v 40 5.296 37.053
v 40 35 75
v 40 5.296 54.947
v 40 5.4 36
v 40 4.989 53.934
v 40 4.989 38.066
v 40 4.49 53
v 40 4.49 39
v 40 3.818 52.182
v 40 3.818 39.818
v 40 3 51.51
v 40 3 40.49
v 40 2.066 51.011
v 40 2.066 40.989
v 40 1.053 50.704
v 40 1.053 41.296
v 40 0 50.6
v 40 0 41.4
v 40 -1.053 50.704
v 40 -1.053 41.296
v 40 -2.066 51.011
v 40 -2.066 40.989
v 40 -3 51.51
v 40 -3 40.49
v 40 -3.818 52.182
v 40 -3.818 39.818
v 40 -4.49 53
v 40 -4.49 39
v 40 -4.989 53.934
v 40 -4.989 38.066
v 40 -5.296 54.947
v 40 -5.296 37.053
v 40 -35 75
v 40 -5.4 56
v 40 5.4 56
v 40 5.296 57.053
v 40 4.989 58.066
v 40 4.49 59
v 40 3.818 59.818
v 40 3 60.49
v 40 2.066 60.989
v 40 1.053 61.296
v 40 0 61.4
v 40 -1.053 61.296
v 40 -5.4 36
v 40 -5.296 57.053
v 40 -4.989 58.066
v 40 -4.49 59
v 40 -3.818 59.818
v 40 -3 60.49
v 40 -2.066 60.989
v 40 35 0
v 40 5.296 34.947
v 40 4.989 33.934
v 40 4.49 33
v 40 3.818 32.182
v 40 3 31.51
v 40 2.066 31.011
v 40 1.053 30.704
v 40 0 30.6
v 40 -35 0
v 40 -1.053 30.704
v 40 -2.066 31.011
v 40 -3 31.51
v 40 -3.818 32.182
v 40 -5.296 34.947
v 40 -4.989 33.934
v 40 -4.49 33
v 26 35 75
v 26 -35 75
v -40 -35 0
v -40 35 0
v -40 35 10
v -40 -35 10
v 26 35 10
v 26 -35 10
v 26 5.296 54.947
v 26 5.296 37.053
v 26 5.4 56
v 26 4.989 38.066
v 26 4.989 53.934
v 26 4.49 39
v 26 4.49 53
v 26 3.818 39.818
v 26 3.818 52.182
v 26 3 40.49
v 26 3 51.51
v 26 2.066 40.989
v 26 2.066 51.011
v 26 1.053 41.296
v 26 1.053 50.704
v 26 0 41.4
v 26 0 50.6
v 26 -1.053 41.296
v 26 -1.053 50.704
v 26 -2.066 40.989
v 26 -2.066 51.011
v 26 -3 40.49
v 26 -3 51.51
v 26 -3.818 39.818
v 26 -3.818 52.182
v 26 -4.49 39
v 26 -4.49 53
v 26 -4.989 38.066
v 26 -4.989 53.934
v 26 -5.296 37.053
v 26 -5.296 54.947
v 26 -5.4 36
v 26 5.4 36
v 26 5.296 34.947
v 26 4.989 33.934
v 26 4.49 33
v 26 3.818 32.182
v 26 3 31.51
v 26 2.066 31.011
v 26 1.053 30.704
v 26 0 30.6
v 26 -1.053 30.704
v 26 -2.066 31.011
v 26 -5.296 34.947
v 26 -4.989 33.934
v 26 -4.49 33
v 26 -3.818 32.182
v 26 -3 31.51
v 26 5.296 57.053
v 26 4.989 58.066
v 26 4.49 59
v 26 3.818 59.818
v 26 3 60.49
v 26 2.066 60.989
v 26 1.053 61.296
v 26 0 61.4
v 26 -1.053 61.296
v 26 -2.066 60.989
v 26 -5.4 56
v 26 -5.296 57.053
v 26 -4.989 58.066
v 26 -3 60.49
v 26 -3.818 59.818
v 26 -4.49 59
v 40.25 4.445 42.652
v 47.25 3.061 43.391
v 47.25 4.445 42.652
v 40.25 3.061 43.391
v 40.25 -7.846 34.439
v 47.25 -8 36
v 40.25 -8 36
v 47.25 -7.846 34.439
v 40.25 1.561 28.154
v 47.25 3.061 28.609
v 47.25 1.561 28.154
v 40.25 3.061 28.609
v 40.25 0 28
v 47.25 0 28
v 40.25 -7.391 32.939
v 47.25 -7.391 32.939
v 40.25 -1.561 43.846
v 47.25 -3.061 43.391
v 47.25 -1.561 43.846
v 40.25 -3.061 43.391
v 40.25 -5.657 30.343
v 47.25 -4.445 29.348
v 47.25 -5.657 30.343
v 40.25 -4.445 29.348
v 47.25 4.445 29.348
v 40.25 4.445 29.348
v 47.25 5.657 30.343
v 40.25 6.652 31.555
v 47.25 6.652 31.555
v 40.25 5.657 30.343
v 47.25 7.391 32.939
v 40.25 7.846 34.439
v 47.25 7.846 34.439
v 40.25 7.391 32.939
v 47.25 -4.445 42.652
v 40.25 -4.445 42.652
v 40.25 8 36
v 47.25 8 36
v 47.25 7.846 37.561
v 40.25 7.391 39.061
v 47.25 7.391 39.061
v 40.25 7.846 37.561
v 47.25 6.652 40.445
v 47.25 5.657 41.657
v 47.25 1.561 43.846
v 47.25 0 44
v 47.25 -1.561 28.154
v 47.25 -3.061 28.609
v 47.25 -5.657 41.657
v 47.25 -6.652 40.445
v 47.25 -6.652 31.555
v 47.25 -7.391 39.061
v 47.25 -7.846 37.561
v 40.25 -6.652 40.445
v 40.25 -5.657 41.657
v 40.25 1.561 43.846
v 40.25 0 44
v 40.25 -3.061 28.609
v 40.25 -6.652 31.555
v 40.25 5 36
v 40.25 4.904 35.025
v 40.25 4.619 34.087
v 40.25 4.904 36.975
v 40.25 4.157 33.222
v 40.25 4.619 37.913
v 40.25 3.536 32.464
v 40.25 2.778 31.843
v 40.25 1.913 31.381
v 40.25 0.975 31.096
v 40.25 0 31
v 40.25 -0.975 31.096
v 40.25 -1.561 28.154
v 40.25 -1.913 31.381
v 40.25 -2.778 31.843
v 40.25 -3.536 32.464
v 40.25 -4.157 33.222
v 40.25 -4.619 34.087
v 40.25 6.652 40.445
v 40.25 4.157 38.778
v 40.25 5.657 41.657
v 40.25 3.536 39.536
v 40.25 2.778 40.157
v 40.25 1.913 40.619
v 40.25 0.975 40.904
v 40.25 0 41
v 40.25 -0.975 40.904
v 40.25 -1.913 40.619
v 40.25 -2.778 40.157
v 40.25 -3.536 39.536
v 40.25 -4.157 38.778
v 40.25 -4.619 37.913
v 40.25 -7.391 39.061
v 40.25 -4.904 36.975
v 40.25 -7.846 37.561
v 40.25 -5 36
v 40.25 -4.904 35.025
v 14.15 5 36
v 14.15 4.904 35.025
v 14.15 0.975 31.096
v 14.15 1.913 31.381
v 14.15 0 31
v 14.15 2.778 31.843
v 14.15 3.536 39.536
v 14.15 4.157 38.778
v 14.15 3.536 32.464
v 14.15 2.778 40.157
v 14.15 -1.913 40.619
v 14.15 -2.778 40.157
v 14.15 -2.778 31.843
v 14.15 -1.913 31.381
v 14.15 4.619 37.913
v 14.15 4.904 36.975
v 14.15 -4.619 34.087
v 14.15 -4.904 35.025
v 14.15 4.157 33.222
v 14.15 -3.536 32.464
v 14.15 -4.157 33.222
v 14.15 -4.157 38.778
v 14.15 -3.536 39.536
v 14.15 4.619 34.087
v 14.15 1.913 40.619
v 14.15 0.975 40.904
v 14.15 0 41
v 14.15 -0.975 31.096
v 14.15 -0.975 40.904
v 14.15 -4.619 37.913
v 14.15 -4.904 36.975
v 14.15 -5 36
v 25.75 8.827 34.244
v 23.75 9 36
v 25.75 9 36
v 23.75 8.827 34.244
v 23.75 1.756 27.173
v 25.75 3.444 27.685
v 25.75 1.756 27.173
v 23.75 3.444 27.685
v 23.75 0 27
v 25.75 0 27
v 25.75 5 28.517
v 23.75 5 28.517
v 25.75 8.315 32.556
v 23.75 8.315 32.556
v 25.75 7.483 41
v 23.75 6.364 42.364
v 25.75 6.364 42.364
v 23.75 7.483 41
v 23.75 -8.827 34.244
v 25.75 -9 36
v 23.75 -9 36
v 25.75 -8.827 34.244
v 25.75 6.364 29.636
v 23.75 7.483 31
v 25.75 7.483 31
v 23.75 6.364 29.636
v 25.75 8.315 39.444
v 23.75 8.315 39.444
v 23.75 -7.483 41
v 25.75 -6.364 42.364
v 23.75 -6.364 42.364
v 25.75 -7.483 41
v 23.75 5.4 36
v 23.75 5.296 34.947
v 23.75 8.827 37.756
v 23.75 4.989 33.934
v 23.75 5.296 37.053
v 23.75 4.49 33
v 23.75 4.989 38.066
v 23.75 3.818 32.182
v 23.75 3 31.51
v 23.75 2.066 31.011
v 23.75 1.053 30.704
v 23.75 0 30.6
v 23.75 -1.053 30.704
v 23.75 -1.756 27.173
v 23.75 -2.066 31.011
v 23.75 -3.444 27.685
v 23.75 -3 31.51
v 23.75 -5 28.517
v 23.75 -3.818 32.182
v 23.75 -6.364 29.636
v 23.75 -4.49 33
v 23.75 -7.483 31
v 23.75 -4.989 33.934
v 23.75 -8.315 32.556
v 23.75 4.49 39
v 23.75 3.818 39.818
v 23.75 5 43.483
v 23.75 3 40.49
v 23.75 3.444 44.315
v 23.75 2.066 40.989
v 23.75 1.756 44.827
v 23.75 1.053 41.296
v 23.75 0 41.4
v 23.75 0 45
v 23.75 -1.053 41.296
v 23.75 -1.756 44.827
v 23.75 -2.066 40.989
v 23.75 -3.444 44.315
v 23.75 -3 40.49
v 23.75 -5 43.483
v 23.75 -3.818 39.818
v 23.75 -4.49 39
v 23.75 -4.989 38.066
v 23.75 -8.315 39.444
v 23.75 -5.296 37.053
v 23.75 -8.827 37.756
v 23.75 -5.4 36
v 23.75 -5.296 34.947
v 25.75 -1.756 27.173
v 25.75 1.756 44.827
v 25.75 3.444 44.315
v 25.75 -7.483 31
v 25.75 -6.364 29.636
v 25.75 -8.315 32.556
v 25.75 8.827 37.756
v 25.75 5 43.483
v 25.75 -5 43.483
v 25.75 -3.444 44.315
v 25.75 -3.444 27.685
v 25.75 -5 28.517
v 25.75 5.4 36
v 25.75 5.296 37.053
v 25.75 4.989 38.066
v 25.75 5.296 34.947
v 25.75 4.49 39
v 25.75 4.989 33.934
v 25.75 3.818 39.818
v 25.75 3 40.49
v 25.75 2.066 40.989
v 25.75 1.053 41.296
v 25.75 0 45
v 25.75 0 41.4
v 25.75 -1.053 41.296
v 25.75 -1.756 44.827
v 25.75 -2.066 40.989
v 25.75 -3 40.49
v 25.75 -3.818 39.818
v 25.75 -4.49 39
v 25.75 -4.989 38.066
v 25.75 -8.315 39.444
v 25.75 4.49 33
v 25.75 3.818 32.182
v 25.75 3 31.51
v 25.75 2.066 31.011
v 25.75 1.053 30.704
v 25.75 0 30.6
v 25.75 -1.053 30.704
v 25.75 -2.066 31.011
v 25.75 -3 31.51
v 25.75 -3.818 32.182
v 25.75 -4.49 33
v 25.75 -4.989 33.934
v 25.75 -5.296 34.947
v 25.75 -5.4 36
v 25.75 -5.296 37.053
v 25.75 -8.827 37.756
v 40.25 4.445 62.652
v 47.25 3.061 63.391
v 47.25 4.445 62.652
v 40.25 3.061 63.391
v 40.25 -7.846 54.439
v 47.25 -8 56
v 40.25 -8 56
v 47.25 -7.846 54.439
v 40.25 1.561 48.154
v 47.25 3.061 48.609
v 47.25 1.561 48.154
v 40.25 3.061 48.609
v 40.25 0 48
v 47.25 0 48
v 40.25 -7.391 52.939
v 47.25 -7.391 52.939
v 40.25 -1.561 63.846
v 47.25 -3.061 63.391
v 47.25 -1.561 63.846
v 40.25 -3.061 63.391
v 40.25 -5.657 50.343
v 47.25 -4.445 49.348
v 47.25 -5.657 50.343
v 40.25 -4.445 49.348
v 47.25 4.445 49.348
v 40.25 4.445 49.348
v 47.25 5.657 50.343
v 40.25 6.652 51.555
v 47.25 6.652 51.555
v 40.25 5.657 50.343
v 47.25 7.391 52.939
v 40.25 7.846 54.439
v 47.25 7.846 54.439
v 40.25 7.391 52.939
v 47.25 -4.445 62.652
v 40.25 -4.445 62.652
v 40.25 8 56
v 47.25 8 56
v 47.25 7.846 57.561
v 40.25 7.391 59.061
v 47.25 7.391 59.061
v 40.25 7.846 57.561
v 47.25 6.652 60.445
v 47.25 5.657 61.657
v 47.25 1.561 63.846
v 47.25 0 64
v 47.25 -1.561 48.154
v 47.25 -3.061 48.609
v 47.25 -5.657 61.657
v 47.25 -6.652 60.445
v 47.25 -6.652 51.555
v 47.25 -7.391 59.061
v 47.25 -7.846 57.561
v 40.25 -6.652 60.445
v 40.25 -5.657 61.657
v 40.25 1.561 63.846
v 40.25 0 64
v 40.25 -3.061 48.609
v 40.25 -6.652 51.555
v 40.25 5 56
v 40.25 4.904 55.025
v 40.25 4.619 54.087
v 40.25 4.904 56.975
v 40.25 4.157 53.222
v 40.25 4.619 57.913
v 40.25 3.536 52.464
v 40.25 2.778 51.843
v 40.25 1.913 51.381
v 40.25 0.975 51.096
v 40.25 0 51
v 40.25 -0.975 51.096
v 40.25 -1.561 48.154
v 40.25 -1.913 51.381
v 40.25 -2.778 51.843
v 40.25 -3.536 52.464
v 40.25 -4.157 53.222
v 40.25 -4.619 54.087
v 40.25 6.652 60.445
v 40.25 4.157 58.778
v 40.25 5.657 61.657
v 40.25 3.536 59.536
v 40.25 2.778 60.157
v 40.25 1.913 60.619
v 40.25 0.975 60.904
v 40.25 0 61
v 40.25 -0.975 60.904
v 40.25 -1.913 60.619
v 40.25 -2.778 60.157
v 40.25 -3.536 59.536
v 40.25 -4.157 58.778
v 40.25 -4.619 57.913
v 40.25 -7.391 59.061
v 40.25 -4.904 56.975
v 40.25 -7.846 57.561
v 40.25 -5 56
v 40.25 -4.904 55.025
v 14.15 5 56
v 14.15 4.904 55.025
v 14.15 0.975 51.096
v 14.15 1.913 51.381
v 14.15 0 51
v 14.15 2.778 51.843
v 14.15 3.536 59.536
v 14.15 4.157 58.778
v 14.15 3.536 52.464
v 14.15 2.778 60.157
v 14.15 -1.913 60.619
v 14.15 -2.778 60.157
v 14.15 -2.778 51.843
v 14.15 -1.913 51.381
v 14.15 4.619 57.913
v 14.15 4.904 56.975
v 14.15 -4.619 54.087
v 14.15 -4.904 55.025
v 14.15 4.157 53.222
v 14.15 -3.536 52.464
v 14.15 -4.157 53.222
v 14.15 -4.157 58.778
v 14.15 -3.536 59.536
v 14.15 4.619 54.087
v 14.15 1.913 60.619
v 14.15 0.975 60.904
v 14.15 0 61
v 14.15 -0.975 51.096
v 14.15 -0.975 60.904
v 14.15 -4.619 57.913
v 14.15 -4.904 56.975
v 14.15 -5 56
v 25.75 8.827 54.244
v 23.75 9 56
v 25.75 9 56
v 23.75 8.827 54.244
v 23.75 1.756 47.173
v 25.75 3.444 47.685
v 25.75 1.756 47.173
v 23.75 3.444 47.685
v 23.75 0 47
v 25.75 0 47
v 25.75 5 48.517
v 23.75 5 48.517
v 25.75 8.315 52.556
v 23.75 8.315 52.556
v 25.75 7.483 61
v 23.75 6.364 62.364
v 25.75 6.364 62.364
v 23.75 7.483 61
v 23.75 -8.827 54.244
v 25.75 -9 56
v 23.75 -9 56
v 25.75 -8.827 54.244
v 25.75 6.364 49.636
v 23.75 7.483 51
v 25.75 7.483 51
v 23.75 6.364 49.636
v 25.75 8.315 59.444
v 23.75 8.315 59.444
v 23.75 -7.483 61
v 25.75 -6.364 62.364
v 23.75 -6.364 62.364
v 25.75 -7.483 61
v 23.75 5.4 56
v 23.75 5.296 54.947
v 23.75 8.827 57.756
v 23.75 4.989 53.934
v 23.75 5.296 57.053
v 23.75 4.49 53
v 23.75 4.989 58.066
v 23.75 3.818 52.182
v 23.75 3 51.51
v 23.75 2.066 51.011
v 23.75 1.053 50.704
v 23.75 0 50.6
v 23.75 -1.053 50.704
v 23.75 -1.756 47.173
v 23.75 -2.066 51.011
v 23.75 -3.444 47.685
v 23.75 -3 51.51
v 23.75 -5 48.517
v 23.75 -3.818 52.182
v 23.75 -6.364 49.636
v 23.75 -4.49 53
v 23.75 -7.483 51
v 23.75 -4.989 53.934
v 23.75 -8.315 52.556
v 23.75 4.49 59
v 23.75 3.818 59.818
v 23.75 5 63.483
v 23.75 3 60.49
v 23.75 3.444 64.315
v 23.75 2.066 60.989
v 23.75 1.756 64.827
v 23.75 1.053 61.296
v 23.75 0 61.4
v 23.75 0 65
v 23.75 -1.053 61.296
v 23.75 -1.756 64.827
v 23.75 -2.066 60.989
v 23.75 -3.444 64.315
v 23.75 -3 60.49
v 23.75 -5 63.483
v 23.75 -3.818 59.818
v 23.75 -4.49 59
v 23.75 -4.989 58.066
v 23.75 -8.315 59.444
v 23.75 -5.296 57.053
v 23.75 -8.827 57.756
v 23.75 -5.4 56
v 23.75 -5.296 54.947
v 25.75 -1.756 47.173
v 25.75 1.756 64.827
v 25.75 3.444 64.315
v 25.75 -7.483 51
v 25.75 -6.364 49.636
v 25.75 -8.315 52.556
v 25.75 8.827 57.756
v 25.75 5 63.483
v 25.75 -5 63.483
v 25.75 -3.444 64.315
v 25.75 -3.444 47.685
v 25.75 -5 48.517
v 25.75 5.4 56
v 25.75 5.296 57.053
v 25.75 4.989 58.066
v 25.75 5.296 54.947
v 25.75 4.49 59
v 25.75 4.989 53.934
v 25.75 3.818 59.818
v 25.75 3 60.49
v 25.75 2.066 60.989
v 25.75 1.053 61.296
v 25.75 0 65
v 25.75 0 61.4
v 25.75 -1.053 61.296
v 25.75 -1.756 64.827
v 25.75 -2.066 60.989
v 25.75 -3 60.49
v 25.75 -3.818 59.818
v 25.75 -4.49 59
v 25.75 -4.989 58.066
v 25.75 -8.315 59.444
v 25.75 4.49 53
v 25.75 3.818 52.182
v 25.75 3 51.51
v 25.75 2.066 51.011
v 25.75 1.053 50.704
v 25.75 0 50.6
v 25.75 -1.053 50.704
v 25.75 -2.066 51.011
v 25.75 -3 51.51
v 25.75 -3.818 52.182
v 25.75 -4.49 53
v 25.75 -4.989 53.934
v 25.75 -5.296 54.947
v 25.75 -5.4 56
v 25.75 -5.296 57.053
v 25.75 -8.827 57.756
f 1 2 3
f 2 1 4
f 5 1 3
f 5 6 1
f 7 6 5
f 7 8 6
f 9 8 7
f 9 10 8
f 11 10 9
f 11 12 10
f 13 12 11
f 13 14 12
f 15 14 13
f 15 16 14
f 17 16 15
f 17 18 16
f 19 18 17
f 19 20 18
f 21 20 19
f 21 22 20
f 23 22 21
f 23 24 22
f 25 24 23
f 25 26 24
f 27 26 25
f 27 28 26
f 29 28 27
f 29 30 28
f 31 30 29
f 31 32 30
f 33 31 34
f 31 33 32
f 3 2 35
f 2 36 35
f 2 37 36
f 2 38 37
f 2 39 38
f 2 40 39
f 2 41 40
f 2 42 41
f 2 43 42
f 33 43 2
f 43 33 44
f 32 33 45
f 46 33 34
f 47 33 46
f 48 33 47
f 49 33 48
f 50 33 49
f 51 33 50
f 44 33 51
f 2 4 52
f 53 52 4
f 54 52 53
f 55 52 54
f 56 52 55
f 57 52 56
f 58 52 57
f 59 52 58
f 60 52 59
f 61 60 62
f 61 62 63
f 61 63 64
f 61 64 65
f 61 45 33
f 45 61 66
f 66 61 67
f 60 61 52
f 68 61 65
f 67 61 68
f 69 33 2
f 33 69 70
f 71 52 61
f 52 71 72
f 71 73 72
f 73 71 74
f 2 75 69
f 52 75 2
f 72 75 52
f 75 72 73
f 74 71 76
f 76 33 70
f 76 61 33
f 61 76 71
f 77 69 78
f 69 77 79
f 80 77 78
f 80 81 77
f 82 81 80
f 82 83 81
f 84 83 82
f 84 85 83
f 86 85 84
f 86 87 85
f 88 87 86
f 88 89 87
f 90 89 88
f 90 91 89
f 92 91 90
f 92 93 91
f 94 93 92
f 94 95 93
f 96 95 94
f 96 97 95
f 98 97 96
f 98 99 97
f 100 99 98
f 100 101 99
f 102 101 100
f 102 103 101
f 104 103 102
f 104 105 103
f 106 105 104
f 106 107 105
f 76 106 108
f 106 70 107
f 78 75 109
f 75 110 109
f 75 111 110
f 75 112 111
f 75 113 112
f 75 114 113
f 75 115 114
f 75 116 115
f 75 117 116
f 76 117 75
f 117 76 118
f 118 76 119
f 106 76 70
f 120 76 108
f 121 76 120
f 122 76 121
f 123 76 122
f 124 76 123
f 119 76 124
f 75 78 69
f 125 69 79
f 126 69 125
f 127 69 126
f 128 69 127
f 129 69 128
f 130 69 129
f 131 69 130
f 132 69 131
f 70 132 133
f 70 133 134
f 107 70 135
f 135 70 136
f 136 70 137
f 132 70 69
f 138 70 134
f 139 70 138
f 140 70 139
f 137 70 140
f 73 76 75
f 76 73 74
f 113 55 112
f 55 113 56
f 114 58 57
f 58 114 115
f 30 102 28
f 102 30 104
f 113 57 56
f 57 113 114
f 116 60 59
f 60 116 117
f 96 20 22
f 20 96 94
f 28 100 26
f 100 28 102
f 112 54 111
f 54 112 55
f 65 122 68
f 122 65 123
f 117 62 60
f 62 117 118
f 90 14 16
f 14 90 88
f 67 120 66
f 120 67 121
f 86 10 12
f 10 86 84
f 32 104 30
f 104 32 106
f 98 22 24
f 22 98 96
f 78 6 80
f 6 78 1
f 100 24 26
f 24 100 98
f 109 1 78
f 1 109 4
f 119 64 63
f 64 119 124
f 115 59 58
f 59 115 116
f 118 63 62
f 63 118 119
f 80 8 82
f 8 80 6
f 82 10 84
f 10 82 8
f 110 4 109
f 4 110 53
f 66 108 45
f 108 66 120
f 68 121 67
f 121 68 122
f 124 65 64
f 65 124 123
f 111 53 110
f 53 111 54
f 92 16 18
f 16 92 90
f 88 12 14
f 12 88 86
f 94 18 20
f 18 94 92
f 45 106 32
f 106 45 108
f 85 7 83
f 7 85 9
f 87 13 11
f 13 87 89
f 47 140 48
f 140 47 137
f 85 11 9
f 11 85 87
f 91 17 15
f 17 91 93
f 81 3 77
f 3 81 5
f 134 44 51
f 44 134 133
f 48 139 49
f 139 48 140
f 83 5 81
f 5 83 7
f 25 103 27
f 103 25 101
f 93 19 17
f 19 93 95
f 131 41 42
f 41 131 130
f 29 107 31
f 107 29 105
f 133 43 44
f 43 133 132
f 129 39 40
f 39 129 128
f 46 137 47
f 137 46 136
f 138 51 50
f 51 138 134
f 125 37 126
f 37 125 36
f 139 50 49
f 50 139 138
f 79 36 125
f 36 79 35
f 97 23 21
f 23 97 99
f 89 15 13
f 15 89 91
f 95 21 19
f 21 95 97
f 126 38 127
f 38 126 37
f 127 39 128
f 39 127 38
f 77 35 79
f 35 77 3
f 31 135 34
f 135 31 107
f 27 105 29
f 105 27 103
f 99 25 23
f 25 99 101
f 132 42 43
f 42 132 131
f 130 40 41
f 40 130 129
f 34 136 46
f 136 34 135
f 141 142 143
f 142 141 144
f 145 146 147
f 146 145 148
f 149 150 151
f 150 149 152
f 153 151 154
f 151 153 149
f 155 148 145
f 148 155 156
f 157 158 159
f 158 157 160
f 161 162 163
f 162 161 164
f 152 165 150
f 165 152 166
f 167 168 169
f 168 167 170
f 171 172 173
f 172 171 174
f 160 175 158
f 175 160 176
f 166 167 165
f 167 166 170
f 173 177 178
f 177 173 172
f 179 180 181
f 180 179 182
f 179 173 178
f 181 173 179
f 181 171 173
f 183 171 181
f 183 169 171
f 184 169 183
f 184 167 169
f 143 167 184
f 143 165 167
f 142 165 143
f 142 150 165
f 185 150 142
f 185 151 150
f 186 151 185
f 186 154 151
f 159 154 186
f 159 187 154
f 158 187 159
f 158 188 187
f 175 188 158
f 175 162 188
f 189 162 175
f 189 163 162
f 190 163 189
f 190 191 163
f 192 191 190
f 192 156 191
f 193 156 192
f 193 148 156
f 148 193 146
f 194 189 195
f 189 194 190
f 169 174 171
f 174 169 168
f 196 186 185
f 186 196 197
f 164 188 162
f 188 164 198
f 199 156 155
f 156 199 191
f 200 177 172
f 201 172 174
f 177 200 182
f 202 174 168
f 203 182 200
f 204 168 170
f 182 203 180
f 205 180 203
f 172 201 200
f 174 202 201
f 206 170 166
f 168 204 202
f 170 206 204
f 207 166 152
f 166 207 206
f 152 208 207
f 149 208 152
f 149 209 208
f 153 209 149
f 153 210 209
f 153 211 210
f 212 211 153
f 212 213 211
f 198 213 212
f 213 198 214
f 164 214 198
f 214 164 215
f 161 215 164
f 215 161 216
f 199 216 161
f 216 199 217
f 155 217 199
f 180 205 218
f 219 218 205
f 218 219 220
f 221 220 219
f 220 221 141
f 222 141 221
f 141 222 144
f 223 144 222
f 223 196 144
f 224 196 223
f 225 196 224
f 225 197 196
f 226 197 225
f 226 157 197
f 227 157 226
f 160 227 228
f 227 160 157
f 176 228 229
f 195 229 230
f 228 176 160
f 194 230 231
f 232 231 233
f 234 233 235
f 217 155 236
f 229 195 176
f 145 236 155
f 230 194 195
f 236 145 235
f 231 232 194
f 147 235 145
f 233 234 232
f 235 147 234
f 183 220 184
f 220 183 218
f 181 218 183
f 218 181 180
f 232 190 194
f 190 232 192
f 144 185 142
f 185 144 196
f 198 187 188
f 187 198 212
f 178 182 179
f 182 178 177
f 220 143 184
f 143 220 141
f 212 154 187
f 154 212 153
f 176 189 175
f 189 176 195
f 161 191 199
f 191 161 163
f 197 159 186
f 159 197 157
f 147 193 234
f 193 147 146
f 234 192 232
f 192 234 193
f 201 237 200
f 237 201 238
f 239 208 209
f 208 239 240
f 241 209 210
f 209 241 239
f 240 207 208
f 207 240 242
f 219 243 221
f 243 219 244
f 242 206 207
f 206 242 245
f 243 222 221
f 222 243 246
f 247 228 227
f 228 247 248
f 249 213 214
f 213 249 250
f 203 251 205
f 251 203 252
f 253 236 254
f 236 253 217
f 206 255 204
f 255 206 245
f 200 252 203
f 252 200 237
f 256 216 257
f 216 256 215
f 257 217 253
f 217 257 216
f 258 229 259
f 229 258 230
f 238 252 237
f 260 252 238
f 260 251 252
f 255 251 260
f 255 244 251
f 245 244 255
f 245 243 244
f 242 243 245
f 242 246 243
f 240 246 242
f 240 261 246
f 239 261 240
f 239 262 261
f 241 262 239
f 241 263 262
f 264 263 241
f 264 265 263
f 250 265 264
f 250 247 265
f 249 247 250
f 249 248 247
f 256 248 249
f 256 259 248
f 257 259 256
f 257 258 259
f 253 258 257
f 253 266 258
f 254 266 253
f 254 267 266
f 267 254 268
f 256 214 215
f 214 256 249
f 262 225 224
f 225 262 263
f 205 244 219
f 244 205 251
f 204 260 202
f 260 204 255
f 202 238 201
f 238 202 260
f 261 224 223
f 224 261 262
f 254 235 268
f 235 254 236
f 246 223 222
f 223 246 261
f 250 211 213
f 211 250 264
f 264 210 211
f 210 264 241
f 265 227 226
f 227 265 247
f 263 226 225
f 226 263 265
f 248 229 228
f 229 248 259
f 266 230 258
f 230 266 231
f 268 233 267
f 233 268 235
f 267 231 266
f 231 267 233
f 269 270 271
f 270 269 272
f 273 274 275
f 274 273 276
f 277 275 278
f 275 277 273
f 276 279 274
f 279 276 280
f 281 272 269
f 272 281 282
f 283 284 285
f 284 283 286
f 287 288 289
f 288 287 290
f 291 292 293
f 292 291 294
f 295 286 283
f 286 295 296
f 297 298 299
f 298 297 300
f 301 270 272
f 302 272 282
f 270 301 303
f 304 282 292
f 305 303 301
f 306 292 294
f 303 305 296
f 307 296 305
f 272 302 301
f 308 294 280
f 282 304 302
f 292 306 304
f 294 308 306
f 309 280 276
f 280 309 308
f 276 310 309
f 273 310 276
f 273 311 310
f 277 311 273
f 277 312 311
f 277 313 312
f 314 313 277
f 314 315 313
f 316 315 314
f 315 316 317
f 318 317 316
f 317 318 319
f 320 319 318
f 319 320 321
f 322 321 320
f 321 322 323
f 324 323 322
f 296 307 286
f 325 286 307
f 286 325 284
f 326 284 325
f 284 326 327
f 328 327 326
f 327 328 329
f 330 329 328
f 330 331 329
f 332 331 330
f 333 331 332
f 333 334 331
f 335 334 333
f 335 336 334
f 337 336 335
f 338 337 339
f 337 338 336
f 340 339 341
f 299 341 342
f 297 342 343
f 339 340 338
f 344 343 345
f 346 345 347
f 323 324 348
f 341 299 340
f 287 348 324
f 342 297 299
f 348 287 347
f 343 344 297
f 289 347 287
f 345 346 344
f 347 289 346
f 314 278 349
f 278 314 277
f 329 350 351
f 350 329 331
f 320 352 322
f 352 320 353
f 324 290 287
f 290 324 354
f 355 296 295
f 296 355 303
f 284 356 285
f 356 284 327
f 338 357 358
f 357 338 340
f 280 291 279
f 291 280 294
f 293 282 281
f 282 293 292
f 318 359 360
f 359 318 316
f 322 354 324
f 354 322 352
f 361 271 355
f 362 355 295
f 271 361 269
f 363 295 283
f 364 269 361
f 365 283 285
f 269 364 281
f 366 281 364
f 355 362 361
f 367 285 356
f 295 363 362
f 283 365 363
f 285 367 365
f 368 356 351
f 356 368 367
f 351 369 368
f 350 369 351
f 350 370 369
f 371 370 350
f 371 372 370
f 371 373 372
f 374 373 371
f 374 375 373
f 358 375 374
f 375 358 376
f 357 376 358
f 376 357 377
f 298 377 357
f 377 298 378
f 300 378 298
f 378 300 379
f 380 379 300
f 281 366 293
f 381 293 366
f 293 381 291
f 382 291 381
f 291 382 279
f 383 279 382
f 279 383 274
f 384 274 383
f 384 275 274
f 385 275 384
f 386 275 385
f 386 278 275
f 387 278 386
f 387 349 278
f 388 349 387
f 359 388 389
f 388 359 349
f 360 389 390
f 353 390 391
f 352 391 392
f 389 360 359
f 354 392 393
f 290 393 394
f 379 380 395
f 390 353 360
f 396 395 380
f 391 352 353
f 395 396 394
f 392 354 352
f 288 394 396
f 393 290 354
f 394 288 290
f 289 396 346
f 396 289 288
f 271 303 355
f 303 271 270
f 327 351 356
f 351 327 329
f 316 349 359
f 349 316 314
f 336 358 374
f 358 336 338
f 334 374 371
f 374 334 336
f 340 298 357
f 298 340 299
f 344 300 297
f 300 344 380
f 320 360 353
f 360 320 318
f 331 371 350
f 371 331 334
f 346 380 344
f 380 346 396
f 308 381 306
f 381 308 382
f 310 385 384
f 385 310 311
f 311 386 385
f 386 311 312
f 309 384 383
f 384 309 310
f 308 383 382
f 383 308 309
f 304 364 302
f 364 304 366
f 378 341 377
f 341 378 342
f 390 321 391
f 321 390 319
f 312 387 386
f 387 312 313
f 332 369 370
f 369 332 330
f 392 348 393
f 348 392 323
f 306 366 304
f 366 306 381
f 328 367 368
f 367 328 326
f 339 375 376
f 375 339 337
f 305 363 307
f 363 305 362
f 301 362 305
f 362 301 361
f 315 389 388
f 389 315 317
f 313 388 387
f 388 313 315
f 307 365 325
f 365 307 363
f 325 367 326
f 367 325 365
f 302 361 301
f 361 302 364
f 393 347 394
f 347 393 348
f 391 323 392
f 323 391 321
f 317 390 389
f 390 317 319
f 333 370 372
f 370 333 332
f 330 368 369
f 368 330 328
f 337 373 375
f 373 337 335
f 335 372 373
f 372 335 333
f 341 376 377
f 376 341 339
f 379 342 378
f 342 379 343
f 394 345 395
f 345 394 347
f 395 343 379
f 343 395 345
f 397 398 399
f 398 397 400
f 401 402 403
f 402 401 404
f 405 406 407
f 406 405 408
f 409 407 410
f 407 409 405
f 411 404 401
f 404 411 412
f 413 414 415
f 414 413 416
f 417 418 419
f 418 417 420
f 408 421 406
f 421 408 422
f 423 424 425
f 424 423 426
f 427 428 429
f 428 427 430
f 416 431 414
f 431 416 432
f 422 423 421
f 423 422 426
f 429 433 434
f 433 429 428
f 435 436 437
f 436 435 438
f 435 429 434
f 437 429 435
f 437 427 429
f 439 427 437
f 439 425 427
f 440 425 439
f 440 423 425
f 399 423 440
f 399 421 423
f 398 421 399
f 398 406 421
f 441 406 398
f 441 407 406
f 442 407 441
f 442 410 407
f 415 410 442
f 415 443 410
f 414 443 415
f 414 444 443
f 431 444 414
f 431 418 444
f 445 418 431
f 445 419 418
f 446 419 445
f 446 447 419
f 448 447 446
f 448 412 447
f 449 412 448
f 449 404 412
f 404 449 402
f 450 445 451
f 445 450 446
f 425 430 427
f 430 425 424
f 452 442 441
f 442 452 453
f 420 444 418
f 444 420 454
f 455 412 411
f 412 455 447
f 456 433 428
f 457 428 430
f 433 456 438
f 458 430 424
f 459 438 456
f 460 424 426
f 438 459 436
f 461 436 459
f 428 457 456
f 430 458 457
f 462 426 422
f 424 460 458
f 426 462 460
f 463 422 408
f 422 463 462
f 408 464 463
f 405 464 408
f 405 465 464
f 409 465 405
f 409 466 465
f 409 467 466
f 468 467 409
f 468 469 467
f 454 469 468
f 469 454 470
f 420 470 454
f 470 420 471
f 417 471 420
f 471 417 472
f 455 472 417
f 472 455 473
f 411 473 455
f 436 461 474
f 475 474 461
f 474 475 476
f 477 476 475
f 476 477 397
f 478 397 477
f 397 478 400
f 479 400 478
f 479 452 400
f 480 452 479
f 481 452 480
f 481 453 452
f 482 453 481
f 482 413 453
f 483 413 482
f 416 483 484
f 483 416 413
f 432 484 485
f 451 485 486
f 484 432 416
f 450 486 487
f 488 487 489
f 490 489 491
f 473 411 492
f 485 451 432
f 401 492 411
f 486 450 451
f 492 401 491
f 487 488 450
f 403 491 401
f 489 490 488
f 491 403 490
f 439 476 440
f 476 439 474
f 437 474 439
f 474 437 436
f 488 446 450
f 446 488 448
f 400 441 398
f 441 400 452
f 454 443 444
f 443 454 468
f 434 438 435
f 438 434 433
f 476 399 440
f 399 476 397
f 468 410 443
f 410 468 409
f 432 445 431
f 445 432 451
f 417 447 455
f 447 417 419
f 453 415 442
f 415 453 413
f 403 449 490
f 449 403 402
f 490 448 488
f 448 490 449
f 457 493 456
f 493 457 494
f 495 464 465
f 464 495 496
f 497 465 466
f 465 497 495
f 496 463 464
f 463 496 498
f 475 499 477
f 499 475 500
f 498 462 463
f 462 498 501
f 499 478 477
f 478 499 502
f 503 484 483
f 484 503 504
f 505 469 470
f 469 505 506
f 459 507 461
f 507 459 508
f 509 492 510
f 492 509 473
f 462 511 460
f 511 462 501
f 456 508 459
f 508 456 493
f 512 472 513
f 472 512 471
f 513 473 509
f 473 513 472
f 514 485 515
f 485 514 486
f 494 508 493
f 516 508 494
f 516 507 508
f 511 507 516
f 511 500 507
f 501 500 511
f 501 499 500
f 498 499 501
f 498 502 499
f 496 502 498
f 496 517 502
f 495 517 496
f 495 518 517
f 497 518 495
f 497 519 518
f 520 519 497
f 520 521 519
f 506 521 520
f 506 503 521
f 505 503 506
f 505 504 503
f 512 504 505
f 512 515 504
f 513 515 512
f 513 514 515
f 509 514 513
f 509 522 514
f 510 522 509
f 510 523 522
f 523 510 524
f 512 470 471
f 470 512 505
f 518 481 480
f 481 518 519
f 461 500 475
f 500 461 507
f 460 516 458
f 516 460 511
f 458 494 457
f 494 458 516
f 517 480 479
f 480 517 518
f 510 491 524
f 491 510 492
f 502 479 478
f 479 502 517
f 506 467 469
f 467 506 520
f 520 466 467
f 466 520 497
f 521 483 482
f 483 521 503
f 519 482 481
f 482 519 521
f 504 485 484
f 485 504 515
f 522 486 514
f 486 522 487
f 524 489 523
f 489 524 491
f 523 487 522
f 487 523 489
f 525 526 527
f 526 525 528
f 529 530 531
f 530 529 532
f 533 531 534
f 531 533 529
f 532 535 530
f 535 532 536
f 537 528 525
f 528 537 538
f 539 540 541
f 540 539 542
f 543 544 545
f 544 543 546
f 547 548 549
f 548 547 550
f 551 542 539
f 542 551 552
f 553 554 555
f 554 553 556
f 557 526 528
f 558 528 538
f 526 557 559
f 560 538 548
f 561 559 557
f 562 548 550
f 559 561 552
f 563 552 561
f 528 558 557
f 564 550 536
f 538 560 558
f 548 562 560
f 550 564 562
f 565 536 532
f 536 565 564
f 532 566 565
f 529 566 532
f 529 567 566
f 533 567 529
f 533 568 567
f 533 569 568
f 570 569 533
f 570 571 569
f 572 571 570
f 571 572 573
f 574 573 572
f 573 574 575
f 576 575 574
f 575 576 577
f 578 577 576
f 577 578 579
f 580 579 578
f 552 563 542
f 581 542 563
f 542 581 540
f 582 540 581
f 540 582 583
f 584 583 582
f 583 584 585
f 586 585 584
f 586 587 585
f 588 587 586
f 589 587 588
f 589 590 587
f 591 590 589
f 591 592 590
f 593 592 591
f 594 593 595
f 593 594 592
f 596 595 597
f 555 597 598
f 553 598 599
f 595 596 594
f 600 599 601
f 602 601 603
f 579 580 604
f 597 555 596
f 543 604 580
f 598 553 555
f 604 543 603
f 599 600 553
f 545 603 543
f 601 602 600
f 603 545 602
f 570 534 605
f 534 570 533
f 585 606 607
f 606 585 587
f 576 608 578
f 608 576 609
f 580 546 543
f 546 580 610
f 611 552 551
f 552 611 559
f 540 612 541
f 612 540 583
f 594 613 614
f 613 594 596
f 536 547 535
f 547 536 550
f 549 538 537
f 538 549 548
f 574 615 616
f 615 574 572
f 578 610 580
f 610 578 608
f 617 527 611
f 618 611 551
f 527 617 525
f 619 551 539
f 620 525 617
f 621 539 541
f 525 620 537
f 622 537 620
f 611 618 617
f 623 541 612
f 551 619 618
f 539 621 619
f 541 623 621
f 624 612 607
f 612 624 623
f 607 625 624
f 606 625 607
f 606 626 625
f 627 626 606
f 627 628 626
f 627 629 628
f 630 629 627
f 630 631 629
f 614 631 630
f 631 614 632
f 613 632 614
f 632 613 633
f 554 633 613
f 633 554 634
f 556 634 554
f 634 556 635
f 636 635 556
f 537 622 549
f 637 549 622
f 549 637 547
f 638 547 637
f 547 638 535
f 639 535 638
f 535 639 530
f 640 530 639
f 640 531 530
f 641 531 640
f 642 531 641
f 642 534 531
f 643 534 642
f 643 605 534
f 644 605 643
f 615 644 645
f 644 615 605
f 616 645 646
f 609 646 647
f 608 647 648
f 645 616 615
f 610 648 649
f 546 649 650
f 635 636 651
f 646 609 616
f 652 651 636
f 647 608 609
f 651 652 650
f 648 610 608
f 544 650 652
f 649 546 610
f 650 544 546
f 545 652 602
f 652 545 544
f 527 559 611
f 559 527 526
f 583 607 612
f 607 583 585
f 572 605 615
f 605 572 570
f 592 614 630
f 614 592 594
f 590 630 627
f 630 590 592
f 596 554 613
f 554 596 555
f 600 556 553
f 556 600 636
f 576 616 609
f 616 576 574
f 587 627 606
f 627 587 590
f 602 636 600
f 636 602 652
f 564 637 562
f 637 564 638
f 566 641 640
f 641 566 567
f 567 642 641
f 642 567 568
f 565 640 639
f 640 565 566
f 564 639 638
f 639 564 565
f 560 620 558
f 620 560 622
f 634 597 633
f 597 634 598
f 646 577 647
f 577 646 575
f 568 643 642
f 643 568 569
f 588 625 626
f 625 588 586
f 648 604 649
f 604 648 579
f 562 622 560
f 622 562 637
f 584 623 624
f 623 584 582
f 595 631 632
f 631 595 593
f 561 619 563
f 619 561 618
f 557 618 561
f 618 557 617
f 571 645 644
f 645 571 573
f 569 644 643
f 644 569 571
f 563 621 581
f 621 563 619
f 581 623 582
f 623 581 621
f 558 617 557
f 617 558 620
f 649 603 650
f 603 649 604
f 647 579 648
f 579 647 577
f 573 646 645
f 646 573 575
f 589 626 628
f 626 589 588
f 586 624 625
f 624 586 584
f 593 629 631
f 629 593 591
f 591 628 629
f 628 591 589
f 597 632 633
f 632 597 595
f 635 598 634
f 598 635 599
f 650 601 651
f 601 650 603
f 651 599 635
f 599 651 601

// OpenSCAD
$fn = 32;

// ------------------------------------------------------------------------
// Bolted bracket: 80 x 70 mm bracket with 2 bolt joints
// Every part is its own module, assembly() places them once.
// ------------------------------------------------------------------------

// --- part 1 ---
module bracket() {
  difference() {
    translate([-40, -35, 0]) cube([80, 70, 75]);
    translate([-41, -36, 10]) cube([67, 72, 66]);
    translate([33, 0, 36]) rotate([0, 90, 0]) cylinder(h = 16, d = 10.8, center = true);
    translate([33, 0, 56]) rotate([0, 90, 0]) cylinder(h = 16, d = 10.8, center = true);
  }
}

// --- part 2 ---
module bolt1() {
  cylinder(h = 7, d = 16);
  translate([0, 0, -26.1]) cylinder(h = 26.1, d = 10);
}

// --- part 3 ---
module washer1() {
  difference() {
      translate([0, 0, 0]) cylinder(h = 2, d = 18);
      translate([0, 0, -1]) cylinder(h = 4, d = 10.8);
    }
}

// --- part 4 ---
module bolt2() {
  cylinder(h = 7, d = 16);
  translate([0, 0, -26.1]) cylinder(h = 26.1, d = 10);
}

// --- part 5 ---
module washer2() {
  difference() {
      translate([0, 0, 0]) cylinder(h = 2, d = 18);
      translate([0, 0, -1]) cylinder(h = 4, d = 10.8);
    }
}

// --- assembly ---
module assembly() {
  translate([0, 0, 0]) rotate([0, 0, 0]) bracket();
  translate([40.25, 0, 36]) rotate([0, 90, 0]) bolt1();
  translate([23.75, 0, 36]) rotate([0, 90, 0]) washer1();
  translate([40.25, 0, 56]) rotate([0, 90, 0]) bolt2();
  translate([23.75, 0, 56]) rotate([0, 90, 0]) washer2();
}

assembly();
